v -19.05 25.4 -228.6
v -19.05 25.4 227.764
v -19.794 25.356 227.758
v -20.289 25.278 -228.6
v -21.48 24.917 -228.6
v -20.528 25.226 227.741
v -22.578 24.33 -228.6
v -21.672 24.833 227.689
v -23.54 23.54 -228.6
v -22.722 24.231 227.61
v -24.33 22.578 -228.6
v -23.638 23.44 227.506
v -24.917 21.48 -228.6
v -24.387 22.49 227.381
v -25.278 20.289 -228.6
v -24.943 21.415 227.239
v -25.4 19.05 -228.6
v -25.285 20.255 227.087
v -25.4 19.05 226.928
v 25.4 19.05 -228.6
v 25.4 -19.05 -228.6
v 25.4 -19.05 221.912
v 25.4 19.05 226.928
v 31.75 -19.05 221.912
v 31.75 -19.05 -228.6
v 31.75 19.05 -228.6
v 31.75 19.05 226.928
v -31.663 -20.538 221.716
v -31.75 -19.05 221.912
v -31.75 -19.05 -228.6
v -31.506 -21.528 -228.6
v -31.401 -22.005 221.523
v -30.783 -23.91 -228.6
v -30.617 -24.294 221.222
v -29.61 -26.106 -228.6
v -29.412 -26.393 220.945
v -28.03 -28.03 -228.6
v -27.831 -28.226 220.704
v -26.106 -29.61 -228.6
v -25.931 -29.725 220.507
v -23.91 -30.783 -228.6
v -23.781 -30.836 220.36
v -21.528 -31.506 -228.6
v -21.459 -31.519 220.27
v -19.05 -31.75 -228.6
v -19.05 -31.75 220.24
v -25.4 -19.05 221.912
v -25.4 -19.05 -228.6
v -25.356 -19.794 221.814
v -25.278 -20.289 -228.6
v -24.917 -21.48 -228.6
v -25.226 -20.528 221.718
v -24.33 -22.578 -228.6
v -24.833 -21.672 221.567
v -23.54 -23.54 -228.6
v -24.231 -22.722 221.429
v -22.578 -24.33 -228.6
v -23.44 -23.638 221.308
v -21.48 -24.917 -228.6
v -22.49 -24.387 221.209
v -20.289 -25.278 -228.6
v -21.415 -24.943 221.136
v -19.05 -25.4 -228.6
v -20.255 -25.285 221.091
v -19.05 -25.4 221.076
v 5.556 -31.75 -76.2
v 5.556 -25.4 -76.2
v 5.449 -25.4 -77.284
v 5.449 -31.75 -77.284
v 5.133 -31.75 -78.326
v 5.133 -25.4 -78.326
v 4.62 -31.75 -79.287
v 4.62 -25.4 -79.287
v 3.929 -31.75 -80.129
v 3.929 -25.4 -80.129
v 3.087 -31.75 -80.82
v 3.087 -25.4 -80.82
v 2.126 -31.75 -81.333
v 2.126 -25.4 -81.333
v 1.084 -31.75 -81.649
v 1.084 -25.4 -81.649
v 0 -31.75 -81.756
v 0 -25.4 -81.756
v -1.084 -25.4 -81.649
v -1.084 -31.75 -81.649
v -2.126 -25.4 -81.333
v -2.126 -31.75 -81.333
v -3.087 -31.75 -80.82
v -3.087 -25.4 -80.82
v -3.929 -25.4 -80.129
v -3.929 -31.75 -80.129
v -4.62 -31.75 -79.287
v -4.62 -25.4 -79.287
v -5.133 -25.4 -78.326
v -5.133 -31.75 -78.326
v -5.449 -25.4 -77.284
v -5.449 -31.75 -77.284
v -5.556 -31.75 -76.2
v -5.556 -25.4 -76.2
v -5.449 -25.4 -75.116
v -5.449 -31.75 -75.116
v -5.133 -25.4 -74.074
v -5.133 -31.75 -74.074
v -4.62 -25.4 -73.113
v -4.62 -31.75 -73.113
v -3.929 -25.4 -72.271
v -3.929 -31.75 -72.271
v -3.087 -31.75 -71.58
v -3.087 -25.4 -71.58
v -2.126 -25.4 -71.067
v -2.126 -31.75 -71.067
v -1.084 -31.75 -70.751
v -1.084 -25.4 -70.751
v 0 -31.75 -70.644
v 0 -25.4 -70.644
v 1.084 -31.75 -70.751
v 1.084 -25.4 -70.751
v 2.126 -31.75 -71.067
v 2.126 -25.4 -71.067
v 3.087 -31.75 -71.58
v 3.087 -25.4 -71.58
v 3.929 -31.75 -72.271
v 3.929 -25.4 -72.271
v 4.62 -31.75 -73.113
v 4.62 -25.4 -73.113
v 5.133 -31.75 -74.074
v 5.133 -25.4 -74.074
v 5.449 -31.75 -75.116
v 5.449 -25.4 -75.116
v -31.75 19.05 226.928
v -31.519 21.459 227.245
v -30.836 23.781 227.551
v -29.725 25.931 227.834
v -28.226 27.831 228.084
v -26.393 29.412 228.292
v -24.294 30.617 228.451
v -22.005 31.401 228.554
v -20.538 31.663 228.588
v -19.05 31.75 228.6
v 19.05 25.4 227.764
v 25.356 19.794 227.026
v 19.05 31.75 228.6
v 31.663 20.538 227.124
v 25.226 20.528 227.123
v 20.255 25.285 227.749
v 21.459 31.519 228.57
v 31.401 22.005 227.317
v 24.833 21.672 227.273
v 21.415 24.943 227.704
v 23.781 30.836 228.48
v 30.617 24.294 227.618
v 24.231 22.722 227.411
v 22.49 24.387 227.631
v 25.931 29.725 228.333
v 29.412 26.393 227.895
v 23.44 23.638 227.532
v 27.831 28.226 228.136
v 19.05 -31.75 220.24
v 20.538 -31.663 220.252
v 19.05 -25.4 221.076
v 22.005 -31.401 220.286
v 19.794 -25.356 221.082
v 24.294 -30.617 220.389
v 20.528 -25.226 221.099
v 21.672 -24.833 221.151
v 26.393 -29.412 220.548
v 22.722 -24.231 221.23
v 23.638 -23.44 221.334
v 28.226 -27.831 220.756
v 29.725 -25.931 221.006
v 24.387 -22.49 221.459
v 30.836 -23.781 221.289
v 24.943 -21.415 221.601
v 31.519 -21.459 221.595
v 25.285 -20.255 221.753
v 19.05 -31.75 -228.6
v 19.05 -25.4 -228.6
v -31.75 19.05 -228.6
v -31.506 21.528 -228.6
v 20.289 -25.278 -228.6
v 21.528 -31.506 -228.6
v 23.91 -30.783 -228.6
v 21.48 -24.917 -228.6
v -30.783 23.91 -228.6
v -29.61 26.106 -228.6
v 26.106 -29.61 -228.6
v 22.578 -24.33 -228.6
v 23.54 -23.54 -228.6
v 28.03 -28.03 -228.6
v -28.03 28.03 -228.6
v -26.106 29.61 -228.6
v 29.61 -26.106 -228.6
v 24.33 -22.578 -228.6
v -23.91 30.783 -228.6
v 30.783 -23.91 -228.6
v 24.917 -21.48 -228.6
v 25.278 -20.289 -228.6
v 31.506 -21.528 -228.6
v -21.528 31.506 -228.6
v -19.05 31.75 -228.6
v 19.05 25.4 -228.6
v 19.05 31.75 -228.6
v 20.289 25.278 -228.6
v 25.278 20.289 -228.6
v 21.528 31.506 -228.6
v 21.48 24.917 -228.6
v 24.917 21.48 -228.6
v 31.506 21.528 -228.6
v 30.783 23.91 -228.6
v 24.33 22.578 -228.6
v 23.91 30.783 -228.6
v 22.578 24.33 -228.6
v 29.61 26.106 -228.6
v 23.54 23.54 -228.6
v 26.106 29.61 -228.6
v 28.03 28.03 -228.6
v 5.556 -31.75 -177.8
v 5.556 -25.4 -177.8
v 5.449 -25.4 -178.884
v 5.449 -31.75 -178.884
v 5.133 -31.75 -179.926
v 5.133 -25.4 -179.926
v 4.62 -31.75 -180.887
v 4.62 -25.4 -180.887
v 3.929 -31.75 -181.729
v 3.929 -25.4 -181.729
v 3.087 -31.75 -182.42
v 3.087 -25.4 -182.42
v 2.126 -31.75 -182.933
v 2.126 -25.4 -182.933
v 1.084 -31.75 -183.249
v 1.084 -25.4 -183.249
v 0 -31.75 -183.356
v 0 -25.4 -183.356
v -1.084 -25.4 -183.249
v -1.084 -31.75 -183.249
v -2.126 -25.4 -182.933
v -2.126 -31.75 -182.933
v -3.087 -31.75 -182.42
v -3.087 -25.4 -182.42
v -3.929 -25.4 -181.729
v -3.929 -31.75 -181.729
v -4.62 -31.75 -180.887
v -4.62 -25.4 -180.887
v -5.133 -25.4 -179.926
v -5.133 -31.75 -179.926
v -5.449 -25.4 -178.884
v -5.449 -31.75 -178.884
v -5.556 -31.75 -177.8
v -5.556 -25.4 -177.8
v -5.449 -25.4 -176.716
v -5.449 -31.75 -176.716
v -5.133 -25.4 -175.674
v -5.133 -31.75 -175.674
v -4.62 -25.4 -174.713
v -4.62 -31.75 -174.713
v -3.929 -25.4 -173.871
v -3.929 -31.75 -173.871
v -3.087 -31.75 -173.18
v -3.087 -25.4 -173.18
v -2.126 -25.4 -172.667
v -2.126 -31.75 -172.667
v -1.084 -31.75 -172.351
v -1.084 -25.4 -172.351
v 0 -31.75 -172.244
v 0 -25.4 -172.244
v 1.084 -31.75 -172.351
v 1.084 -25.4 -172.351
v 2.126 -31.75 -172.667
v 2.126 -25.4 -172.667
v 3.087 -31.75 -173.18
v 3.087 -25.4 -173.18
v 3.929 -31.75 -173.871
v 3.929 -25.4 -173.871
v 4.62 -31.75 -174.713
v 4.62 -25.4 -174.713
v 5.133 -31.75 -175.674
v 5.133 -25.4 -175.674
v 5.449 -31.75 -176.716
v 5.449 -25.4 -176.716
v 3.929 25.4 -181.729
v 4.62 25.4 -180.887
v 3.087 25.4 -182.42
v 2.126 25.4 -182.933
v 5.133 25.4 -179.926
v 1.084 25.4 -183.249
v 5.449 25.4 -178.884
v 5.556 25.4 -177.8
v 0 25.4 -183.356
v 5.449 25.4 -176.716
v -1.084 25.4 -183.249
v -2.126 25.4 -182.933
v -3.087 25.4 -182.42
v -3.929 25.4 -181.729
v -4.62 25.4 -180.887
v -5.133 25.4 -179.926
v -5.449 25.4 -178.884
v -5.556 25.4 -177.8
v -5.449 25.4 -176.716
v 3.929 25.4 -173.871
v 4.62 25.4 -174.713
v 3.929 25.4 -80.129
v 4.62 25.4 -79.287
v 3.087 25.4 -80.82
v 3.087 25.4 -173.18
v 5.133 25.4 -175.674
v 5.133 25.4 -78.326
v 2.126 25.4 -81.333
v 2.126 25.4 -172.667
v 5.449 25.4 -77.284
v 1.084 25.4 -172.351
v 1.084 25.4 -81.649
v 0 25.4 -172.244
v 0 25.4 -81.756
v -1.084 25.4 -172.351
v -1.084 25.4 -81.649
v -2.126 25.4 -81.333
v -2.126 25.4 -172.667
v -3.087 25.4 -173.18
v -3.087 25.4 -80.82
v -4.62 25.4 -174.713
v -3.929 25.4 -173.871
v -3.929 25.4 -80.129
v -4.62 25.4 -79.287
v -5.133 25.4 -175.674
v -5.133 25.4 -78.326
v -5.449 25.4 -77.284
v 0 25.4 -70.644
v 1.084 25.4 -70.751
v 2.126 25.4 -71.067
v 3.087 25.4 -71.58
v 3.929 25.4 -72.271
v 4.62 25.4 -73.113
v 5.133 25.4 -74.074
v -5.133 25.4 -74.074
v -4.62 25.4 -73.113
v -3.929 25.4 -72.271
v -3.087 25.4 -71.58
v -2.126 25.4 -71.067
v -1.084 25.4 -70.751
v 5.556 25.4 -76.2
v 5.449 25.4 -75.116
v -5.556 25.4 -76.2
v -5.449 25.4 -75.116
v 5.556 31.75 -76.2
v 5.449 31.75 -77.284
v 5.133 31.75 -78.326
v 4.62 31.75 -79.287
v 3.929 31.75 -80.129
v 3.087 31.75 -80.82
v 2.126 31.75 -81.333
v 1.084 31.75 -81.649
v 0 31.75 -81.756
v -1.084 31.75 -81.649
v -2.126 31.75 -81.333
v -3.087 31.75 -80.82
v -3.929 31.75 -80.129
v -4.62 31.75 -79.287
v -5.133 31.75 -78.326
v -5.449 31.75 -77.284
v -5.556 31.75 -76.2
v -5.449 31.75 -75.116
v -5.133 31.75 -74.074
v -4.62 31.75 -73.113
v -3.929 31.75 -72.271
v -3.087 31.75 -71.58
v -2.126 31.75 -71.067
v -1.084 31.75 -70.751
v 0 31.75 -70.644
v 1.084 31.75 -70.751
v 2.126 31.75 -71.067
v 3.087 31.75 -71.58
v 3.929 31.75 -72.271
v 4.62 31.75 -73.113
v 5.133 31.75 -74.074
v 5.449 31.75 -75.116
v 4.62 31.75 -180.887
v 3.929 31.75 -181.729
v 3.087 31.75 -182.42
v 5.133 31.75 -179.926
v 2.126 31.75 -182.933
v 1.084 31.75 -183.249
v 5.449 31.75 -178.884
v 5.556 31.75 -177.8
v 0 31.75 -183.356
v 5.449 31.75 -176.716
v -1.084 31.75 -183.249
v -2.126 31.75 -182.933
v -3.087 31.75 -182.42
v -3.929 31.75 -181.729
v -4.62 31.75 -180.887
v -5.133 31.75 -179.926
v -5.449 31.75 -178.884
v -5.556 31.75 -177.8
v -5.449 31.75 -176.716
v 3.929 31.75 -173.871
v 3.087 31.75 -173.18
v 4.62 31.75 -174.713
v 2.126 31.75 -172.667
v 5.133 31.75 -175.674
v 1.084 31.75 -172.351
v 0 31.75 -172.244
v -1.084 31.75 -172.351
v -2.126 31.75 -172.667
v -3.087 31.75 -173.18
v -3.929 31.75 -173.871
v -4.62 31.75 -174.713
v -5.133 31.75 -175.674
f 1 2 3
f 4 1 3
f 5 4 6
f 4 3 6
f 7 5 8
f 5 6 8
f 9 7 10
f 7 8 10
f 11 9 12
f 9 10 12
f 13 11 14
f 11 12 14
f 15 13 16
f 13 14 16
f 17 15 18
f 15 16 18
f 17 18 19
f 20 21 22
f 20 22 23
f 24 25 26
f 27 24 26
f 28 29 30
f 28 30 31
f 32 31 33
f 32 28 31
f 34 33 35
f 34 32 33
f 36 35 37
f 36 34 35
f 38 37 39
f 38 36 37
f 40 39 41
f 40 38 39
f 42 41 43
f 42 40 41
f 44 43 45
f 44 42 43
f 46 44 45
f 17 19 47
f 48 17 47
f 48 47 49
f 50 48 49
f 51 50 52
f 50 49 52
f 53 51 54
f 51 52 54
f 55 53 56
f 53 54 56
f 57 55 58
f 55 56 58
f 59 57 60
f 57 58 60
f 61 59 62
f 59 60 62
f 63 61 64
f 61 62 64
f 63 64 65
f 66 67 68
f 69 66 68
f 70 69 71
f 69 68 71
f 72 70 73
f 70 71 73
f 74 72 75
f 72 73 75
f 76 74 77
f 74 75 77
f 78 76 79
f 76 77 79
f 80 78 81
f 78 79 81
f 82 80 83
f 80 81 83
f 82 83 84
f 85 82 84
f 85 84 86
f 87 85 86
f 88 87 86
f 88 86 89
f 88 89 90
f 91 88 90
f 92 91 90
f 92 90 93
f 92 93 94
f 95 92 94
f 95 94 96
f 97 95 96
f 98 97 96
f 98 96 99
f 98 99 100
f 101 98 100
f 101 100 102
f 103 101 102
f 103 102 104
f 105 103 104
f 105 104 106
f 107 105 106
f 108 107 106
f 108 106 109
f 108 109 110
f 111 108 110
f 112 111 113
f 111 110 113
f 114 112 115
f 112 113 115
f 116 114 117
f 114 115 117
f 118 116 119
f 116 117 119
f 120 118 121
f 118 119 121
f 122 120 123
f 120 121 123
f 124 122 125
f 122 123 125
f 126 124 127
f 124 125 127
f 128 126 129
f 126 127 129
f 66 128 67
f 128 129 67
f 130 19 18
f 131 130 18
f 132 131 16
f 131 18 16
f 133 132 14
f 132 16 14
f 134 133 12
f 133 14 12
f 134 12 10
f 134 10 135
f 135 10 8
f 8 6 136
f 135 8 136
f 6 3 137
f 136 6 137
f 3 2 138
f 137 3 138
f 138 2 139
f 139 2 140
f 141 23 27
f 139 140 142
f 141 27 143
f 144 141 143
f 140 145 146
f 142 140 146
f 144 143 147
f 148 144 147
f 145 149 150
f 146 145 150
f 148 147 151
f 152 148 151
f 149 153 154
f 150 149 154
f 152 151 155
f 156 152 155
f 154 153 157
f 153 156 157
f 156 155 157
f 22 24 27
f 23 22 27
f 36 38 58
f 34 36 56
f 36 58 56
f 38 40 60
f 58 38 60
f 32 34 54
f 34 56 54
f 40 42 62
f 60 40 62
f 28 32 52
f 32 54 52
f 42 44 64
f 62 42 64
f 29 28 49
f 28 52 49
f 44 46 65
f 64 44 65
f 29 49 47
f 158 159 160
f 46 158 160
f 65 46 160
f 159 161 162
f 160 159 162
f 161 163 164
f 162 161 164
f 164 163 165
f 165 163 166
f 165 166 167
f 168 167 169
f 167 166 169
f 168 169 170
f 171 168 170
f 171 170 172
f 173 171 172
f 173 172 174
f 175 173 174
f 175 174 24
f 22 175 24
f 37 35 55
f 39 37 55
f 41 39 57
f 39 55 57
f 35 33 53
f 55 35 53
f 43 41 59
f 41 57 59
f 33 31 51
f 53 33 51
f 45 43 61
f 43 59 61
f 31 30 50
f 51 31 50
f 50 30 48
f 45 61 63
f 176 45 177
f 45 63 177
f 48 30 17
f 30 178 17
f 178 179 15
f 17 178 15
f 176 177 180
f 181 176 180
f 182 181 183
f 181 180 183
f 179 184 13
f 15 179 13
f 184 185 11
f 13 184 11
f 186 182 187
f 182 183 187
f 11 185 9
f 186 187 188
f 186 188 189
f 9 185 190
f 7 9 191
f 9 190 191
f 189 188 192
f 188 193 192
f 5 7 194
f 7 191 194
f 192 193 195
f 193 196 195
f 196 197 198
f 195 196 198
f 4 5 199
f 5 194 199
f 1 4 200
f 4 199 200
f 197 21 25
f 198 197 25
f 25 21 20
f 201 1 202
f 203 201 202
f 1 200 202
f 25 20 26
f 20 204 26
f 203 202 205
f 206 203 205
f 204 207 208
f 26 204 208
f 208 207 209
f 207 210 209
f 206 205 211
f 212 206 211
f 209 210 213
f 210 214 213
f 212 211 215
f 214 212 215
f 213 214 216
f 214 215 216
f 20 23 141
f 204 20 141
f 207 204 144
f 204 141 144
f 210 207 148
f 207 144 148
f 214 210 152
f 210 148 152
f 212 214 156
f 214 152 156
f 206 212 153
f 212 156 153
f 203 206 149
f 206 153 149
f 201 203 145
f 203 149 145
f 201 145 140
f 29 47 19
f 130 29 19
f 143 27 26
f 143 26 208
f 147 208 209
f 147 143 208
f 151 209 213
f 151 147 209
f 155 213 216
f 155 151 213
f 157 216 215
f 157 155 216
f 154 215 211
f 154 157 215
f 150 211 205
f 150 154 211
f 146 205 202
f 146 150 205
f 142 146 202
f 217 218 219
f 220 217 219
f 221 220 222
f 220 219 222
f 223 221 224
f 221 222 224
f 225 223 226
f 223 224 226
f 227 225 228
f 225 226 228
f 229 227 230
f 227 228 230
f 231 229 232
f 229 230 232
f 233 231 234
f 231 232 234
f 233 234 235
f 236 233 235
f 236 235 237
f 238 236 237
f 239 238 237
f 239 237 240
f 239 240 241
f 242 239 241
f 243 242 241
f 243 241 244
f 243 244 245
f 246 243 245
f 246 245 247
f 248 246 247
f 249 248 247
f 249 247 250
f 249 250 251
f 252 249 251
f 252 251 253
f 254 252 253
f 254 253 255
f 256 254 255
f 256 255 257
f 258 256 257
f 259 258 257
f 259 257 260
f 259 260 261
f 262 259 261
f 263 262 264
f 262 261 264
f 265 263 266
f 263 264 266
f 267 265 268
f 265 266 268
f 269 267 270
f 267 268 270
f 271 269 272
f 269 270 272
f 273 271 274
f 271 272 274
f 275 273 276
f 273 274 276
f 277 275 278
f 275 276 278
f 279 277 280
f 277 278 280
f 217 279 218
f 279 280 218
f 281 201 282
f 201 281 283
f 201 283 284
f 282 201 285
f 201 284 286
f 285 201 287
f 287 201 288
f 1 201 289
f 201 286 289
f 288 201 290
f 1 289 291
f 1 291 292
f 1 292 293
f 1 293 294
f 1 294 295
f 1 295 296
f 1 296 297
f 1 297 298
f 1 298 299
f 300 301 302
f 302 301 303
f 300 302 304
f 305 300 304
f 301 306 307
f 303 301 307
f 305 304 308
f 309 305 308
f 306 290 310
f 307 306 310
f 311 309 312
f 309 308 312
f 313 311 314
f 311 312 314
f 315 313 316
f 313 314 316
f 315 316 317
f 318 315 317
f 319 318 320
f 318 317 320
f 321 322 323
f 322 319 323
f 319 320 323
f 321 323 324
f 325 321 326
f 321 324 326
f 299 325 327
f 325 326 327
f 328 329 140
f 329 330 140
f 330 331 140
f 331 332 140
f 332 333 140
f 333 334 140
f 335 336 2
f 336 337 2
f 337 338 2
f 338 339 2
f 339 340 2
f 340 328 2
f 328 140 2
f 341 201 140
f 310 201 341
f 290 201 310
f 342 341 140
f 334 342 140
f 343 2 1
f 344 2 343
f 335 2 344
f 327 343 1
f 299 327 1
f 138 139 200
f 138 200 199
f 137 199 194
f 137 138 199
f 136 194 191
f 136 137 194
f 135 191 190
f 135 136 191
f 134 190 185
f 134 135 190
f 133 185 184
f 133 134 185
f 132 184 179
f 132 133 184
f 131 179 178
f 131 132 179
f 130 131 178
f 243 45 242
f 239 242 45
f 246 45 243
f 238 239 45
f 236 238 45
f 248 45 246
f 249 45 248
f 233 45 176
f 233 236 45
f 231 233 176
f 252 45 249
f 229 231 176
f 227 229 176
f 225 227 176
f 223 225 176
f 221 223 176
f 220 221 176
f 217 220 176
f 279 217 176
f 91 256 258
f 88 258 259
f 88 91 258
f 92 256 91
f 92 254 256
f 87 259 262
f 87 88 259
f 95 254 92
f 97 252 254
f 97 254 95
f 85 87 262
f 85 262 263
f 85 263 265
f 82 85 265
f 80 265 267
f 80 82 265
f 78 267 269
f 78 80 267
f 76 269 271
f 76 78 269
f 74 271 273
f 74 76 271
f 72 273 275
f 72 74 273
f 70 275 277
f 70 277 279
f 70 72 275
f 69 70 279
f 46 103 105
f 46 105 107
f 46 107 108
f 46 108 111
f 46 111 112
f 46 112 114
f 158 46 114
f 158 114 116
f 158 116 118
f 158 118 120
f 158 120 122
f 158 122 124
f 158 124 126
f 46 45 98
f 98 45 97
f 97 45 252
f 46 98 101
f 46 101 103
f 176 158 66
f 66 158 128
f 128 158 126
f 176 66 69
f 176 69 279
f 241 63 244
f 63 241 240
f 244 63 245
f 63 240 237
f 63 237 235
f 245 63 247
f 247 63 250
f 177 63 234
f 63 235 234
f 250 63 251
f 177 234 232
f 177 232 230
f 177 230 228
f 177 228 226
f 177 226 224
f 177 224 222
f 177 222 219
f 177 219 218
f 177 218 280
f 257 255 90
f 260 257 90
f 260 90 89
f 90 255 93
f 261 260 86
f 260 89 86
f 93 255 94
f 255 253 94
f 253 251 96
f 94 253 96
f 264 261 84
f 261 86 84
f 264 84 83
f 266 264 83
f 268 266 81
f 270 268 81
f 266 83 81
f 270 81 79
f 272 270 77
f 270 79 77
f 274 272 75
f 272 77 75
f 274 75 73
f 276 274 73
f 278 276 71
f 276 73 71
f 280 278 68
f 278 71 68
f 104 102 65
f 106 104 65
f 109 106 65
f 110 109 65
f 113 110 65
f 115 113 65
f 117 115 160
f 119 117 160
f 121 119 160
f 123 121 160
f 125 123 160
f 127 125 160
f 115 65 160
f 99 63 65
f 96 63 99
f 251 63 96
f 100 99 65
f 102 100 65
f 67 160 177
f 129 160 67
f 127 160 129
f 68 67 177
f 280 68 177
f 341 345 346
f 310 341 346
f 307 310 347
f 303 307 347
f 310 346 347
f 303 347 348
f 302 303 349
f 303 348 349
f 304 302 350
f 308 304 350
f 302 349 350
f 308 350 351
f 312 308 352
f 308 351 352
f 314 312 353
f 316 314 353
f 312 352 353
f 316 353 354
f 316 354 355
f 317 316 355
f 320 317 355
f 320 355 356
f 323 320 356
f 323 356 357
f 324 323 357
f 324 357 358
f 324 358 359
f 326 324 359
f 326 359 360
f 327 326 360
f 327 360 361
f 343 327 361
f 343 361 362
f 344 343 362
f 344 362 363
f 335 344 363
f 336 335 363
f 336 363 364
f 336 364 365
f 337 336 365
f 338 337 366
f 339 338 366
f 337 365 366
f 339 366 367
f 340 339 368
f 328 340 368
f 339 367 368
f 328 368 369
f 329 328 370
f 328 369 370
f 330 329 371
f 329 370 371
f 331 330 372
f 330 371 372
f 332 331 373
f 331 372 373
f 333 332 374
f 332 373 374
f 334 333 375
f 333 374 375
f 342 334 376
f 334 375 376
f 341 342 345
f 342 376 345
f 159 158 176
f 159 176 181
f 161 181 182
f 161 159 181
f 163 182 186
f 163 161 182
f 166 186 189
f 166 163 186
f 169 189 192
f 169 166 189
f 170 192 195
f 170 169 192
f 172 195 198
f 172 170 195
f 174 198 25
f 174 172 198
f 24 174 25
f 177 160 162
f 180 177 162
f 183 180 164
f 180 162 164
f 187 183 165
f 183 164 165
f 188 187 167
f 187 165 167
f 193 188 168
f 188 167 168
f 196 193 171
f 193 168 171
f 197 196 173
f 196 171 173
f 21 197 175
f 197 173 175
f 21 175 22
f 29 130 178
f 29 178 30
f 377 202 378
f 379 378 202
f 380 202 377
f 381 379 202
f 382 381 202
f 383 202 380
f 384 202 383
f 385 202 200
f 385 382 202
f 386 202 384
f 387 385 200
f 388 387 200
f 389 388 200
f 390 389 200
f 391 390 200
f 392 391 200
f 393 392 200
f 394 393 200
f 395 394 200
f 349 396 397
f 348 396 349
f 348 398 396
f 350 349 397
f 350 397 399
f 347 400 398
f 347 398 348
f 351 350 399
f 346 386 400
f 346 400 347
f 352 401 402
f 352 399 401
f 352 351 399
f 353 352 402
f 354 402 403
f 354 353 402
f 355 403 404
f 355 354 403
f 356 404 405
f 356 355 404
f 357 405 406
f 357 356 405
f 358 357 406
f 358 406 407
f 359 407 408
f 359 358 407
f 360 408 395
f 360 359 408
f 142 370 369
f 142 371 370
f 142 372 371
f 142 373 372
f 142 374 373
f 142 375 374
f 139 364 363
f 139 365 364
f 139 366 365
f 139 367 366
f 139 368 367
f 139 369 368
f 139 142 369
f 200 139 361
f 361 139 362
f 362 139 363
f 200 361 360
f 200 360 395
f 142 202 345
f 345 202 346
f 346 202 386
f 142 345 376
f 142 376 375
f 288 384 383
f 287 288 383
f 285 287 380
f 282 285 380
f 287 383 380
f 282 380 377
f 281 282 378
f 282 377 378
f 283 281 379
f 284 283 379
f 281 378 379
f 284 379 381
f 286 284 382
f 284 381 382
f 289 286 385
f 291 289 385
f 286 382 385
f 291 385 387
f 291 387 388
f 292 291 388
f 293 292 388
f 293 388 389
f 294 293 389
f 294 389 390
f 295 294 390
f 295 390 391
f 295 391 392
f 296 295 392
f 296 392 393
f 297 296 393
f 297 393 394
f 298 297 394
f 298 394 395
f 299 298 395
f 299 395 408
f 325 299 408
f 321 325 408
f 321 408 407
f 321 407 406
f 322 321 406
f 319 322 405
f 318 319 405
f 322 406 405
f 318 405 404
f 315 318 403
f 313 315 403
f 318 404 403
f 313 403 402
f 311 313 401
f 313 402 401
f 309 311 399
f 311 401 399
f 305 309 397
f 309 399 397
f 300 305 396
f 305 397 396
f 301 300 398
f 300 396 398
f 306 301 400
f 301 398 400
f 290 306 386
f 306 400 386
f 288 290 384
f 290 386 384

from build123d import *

# Parameters (mm, degrees)
BOSS_EXTRUDE1_DEPTH = 228.6
SKETCH3_R           = 5.55625
CUT_EXTRUDE1_DEPTH  = 64.5
CUT_EXTRUDE2_DEPTH  = 64.5


with BuildPart() as part:
    # Sketch1 → Boss-Extrude1 (new body, symmetric)
    with BuildSketch(Plane.XY):
        with BuildLine():
            Line((19.05, 31.75), (-19.05, 31.75))
            ThreePointArc((-19.05, 31.75), (-28.030256121, 28.030256121), (-31.75, 19.05))
            Line((-31.75, 19.05), (-31.75, -19.05))
            ThreePointArc((-31.75, -19.05), (-28.030256121, -28.030256121), (-19.05, -31.75))
            Line((-19.05, -31.75), (19.05, -31.75))
            ThreePointArc((19.05, -31.75), (28.030256121, -28.030256121), (31.75, -19.05))
            Line((31.75, -19.05), (31.75, 19.05))
            ThreePointArc((31.75, 19.05), (28.030256121, 28.030256121), (19.05, 31.75))
        make_face()
        with BuildLine():
            ThreePointArc((-25.4, -19.05), (-23.540128061, -23.540128061), (-19.05, -25.4))
            Line((-19.05, -25.4), (19.05, -25.4))
            ThreePointArc((19.05, -25.4), (23.540128061, -23.540128061), (25.4, -19.05))
            Line((25.4, -19.05), (25.4, 19.05))
            ThreePointArc((25.4, 19.05), (23.540128061, 23.540128061), (19.05, 25.4))
            Line((19.05, 25.4), (-19.05, 25.4))
            ThreePointArc((-19.05, 25.4), (-23.540128061, 23.540128061), (-25.4, 19.05))
            Line((-25.4, 19.05), (-25.4, -19.05))
        make_face(mode=Mode.SUBTRACT)
    extrude(amount=BOSS_EXTRUDE1_DEPTH, both=True)

    # Sketch3 → Cut-Extrude1 (cut, through all)
    with BuildSketch(Plane(origin=(0, 31.75, 0), x_dir=(1, 0, 0), z_dir=(0, 1, 0))):
        with Locations((0, 177.8)):
            Circle(SKETCH3_R)
        with Locations((0, 76.2)):
            Circle(SKETCH3_R)
    extrude(amount=-CUT_EXTRUDE1_DEPTH, mode=Mode.SUBTRACT)

    # Sketch4 → Cut-Extrude2 (cut, through all)
    with BuildSketch(Plane(origin=(31.75, 0, 0), x_dir=(0, 0, -1), z_dir=(1, 0, 0))):
        Polygon((-221.912053123, -19.05), (-228.6, -19.05), (-228.6, -114.266943845), (-209.376504653, -114.266943845), align=None)
        Polygon((-226.928013281, 19.05), (-228.6, 19.05), (-228.6, -19.05), (-221.912053123, -19.05), align=None)
        Polygon((-226.928013281, 19.05), (-228.6, 31.75), (-228.6, 19.05), align=None)
    extrude(amount=-CUT_EXTRUDE2_DEPTH, mode=Mode.SUBTRACT)


solid = part.part
